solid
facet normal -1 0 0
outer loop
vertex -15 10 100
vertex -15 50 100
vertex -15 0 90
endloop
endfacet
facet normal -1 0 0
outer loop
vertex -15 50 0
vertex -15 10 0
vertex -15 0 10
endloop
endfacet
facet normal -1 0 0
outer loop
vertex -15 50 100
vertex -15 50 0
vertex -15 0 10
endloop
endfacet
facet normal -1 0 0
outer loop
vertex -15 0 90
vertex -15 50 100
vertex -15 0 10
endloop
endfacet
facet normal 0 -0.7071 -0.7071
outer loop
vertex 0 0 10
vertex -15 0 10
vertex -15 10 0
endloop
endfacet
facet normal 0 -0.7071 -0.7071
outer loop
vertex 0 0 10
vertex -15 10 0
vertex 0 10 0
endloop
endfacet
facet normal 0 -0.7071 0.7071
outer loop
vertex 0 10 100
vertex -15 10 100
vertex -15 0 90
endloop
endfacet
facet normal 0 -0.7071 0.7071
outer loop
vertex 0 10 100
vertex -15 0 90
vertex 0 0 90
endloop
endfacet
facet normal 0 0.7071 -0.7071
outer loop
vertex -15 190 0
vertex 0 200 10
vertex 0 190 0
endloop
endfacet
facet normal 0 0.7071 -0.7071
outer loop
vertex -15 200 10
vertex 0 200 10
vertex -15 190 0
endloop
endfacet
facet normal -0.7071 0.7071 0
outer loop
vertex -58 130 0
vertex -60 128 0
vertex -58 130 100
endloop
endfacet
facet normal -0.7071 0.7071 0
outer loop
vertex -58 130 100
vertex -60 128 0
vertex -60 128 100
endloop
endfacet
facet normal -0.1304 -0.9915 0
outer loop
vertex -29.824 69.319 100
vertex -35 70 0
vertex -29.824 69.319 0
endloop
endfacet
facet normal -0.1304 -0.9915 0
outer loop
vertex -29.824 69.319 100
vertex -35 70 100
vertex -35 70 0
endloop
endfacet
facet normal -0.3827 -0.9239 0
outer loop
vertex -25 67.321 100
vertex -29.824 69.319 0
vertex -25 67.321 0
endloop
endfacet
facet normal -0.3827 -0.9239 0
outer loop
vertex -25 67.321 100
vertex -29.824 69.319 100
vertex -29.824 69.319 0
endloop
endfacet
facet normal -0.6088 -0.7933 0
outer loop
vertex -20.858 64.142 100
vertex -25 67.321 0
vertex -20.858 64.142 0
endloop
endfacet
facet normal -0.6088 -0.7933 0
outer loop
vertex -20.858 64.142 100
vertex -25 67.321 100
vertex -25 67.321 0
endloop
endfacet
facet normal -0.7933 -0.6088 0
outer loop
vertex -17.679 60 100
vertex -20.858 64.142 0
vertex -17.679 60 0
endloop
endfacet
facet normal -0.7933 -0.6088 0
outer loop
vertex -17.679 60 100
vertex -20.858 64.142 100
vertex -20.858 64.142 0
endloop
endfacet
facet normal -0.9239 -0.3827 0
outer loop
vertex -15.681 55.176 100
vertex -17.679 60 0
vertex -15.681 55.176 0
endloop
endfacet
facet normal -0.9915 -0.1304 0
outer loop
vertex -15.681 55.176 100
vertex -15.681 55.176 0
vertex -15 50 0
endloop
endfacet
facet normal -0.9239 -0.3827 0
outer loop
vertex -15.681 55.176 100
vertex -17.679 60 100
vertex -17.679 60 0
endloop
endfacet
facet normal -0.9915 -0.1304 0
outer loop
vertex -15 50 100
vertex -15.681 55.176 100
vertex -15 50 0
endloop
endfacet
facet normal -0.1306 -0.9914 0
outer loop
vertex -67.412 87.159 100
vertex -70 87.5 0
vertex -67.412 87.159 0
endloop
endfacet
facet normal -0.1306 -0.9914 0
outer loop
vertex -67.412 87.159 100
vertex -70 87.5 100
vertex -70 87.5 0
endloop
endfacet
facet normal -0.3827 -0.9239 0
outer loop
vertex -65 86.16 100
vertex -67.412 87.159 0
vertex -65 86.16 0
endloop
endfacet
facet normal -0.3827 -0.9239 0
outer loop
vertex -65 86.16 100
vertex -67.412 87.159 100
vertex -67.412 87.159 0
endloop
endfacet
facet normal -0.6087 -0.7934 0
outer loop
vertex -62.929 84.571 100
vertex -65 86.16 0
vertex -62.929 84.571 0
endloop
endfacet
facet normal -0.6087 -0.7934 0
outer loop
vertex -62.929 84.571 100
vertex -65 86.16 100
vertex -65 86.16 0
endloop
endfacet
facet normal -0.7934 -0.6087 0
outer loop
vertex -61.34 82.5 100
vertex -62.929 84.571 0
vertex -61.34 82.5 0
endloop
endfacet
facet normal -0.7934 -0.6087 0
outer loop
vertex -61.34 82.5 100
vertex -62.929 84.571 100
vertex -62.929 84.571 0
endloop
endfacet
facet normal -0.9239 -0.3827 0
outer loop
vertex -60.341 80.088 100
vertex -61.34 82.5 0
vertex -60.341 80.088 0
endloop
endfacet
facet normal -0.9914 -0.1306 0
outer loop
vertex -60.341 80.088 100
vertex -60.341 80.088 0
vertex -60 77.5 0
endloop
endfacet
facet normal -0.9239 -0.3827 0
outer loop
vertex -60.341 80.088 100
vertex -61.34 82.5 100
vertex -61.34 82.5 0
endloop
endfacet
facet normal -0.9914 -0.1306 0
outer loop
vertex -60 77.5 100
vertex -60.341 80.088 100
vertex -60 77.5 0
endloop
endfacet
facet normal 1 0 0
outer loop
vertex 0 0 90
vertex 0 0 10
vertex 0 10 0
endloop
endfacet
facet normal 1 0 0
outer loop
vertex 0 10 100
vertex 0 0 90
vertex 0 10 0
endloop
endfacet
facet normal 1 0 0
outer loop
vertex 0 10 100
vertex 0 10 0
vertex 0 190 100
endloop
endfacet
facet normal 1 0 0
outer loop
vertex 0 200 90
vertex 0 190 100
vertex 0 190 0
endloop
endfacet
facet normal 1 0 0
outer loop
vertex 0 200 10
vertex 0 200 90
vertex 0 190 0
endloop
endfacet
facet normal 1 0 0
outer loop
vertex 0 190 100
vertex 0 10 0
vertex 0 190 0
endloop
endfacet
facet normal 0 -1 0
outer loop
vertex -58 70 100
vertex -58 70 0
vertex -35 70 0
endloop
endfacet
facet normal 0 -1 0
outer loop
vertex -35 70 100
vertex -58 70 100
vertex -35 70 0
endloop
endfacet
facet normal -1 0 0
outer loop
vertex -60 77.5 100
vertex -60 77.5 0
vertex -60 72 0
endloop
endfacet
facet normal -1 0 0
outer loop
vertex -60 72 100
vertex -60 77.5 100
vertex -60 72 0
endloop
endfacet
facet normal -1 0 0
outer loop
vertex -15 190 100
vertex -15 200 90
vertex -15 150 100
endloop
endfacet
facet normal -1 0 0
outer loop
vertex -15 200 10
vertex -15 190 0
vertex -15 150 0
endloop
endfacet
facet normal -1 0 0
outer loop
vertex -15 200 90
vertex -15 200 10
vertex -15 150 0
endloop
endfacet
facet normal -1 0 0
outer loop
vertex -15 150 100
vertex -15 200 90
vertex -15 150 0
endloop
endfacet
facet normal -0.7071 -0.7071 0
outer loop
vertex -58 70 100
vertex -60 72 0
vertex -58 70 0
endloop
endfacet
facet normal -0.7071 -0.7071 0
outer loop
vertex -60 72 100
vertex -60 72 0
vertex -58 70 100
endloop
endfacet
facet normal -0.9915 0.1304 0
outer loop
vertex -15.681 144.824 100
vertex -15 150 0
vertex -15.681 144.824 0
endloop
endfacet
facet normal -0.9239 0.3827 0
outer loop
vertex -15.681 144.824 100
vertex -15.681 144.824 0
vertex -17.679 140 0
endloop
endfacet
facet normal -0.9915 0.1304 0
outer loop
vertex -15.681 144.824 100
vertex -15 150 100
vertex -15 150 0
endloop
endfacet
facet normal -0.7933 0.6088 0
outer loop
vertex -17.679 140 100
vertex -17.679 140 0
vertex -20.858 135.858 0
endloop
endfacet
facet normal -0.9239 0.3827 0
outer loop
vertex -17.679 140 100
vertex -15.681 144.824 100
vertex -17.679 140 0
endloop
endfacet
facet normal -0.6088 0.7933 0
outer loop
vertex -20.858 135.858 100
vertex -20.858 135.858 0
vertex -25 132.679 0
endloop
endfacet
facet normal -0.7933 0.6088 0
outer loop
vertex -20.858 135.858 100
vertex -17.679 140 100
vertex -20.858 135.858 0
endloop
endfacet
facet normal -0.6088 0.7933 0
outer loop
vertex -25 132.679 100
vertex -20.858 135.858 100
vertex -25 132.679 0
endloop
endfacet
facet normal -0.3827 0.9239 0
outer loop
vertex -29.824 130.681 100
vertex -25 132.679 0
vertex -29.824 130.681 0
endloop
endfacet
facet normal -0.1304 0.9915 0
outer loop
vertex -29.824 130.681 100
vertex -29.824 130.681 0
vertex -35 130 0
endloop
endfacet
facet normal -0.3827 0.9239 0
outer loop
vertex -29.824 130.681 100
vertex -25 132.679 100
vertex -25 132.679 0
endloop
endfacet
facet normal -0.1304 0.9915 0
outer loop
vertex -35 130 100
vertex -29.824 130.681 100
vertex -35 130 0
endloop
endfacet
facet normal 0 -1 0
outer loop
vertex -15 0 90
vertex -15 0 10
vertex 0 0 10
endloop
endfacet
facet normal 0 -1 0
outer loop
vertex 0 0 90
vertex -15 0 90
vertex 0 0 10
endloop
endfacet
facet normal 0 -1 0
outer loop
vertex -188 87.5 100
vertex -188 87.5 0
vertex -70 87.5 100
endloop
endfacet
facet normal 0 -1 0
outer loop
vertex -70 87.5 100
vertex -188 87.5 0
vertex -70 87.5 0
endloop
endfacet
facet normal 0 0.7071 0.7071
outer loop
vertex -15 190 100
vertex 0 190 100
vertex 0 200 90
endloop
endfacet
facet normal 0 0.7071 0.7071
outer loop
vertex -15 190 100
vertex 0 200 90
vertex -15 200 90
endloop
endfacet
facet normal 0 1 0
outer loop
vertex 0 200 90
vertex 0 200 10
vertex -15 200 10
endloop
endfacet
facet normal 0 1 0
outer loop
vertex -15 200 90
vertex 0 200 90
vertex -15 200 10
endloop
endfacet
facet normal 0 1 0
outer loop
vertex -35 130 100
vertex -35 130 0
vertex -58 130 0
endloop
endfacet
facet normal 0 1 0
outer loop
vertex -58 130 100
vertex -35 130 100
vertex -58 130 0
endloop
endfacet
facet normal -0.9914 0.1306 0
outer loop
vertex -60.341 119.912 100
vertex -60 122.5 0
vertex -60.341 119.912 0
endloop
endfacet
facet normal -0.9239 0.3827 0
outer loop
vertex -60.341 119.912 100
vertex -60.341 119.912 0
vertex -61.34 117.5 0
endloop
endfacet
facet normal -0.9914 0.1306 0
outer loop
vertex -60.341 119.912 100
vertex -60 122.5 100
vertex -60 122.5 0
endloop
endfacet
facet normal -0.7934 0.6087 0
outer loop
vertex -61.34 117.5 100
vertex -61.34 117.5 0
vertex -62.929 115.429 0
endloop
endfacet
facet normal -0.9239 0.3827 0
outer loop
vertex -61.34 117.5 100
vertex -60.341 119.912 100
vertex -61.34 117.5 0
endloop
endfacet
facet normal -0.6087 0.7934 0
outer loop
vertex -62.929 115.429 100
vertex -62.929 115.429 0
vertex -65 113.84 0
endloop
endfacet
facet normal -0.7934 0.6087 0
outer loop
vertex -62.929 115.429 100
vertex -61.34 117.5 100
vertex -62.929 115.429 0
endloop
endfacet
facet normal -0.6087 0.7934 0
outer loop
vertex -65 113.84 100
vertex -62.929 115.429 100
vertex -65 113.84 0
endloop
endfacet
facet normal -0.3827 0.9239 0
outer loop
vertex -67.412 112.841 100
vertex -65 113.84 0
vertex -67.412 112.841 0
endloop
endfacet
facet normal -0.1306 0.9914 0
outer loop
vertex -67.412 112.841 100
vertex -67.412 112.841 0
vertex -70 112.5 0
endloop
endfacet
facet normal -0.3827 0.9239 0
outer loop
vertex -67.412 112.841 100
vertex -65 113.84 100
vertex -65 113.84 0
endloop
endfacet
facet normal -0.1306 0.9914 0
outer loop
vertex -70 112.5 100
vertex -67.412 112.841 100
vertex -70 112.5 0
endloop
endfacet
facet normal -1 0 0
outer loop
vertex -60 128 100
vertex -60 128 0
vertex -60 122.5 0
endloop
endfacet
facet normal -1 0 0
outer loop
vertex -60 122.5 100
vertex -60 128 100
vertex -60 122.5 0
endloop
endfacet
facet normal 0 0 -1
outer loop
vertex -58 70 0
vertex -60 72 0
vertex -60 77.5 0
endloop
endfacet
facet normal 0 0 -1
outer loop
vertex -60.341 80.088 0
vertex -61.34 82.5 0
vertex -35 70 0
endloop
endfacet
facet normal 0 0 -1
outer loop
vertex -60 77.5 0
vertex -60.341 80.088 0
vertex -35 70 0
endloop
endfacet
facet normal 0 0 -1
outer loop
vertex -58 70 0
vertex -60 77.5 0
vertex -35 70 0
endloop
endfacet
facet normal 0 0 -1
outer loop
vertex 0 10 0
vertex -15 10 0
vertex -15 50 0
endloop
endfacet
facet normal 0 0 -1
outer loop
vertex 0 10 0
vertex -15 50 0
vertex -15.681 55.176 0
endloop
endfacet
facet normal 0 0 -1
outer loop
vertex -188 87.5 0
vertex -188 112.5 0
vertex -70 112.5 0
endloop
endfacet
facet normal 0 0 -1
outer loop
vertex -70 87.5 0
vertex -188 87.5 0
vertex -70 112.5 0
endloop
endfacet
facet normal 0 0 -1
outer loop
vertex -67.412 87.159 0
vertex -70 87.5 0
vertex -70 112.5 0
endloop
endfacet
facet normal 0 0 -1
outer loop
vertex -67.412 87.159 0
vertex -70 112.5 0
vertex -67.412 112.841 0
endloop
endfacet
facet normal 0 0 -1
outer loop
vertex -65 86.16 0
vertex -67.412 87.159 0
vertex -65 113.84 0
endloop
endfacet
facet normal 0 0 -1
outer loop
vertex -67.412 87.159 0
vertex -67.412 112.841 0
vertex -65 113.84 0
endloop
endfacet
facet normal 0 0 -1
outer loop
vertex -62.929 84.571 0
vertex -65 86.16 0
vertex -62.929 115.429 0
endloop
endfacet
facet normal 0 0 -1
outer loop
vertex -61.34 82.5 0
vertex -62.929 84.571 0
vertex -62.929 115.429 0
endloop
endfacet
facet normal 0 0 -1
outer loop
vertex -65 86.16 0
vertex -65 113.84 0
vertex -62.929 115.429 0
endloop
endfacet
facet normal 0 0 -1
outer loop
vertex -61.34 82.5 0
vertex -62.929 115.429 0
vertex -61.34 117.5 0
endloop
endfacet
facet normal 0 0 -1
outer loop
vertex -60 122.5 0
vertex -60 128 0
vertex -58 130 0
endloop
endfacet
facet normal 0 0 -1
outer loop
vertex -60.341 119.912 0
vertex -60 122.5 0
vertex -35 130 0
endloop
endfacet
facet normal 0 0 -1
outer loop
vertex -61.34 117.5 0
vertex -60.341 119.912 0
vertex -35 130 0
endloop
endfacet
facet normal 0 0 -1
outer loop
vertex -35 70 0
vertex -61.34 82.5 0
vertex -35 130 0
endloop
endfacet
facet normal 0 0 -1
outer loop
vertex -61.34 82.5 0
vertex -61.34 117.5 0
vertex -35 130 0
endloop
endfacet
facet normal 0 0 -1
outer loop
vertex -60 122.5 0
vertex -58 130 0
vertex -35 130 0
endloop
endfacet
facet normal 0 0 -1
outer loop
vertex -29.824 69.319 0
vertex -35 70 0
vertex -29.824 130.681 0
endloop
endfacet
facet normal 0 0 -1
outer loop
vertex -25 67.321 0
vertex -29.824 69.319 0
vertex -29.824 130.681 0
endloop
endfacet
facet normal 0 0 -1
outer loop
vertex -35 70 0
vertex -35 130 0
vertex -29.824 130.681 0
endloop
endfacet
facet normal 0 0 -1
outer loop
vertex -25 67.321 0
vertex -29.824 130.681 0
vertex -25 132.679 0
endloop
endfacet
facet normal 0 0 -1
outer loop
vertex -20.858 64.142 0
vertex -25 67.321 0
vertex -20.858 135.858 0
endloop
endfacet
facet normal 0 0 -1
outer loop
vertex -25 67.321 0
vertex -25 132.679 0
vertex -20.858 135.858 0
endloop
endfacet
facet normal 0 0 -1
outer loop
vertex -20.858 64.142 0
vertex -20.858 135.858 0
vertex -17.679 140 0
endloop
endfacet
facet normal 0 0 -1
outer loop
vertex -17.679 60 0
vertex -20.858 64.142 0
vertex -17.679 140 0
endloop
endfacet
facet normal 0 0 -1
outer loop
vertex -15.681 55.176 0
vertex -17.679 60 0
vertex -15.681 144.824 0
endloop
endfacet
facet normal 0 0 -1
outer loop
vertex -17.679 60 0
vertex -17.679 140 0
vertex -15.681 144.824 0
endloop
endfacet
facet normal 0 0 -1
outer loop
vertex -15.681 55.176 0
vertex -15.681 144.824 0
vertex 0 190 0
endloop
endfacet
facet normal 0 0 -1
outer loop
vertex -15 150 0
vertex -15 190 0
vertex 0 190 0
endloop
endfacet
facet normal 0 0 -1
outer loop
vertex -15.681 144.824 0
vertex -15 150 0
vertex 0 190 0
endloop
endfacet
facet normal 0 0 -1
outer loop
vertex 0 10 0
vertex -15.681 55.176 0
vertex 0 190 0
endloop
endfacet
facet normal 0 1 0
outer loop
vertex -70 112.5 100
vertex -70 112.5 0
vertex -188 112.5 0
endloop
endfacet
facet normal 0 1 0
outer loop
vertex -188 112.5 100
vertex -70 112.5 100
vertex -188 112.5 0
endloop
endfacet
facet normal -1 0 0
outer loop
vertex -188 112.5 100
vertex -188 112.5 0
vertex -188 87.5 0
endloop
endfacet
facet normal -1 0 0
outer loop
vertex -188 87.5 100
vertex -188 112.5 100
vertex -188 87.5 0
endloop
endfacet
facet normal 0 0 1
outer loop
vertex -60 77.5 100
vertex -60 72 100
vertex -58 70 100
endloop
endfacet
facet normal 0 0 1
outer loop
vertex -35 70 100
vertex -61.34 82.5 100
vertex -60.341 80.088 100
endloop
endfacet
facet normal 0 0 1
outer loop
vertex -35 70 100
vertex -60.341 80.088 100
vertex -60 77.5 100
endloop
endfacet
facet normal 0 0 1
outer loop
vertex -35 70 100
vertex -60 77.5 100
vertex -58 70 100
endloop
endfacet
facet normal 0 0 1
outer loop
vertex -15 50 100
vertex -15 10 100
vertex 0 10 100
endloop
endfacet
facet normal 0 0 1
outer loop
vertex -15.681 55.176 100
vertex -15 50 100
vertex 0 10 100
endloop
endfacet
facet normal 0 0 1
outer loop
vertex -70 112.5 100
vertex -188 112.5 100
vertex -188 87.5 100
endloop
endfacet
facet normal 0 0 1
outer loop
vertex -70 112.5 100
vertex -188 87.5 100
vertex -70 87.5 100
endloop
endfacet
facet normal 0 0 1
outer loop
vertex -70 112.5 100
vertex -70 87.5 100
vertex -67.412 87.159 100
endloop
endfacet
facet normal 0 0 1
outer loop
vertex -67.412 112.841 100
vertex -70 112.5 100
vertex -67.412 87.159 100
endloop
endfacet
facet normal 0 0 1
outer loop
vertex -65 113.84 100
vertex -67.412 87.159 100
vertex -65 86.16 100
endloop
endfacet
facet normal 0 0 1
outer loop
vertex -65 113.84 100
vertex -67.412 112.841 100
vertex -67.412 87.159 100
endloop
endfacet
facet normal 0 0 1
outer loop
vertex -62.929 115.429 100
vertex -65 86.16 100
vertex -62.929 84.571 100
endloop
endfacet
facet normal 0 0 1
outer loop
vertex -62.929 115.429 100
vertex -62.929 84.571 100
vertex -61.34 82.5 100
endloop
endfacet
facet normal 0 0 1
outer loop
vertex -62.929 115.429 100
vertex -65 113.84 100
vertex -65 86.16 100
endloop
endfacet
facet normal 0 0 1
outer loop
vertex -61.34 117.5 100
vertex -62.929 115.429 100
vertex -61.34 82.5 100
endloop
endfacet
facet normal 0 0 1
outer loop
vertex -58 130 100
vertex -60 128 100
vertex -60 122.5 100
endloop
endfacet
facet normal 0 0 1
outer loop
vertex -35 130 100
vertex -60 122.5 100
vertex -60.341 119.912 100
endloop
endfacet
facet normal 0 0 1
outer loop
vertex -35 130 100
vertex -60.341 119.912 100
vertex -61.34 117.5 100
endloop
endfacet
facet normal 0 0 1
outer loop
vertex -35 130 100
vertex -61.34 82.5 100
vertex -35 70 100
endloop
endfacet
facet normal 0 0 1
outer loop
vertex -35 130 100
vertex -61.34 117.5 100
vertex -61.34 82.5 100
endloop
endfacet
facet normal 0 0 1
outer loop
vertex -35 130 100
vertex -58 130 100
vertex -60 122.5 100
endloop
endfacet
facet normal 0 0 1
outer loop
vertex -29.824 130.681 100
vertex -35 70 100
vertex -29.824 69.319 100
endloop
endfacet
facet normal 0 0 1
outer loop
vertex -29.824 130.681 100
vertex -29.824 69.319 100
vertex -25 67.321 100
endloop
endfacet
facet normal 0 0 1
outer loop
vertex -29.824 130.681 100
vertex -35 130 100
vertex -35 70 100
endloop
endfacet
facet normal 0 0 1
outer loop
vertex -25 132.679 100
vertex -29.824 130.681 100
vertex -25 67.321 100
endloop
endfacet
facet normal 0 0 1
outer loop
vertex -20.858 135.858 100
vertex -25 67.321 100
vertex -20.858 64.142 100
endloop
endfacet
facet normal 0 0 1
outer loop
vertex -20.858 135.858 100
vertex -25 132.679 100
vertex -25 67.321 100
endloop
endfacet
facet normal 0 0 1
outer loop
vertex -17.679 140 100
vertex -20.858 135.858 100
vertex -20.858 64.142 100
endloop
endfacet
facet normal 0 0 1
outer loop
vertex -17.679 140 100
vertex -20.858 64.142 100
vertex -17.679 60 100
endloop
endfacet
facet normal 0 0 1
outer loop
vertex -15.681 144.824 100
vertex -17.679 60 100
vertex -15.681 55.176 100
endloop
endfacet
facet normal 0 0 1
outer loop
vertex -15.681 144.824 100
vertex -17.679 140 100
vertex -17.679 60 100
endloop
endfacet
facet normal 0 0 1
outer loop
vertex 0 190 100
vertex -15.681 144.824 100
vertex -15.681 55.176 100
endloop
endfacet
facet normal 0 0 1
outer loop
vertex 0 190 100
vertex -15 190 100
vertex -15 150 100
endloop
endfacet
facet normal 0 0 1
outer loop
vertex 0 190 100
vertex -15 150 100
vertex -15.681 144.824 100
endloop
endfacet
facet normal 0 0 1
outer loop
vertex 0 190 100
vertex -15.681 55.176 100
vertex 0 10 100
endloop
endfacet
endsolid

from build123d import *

# Parameters (mm, degrees)
F1_DEPTH = 100
F2_R     = 20
F3_R     = 10
F4_SIZE  = 10
F5_SIZE  = 2


with BuildPart() as f1:
    # F0 (on Top) → F1 (new body)
    with BuildSketch(Plane.XY):
        Polygon((-15, 0), (0, 0), (0, 200), (-15, 200), (-15, 130), (-60, 130), (-60, 112.5), (-188, 112.5), (-188, 87.5), (-60, 87.5), (-60, 70), (-15, 70), align=None)
    extrude(amount=F1_DEPTH)

    # F2
    f2_edges = [f1.edges().sort_by_distance(p)[0] for p in [
        (-15, 70, 50),
        (-15, 130, 50),
    ]]
    fillet(f2_edges, radius=F2_R)

    # F3
    f3_edges = [f1.edges().sort_by_distance(p)[0] for p in [
        (-60, 87.5, 50),
        (-60, 112.5, 50),
    ]]
    fillet(f3_edges, radius=F3_R)

    # F4
    f4_edges = [f1.edges().sort_by_distance(p)[0] for p in [
        (-7.5, 200, 100),
        (-7.5, 0, 100),
        (-7.5, 0, 0),
        (-7.5, 200, 0),
    ]]
    chamfer(f4_edges, length=F4_SIZE)

    # F5
    f5_edges = [f1.edges().sort_by_distance(p)[0] for p in [
        (-60, 70, 50),
        (-60, 130, 50),
    ]]
    chamfer(f5_edges, length=F5_SIZE)


solid = f1.part
